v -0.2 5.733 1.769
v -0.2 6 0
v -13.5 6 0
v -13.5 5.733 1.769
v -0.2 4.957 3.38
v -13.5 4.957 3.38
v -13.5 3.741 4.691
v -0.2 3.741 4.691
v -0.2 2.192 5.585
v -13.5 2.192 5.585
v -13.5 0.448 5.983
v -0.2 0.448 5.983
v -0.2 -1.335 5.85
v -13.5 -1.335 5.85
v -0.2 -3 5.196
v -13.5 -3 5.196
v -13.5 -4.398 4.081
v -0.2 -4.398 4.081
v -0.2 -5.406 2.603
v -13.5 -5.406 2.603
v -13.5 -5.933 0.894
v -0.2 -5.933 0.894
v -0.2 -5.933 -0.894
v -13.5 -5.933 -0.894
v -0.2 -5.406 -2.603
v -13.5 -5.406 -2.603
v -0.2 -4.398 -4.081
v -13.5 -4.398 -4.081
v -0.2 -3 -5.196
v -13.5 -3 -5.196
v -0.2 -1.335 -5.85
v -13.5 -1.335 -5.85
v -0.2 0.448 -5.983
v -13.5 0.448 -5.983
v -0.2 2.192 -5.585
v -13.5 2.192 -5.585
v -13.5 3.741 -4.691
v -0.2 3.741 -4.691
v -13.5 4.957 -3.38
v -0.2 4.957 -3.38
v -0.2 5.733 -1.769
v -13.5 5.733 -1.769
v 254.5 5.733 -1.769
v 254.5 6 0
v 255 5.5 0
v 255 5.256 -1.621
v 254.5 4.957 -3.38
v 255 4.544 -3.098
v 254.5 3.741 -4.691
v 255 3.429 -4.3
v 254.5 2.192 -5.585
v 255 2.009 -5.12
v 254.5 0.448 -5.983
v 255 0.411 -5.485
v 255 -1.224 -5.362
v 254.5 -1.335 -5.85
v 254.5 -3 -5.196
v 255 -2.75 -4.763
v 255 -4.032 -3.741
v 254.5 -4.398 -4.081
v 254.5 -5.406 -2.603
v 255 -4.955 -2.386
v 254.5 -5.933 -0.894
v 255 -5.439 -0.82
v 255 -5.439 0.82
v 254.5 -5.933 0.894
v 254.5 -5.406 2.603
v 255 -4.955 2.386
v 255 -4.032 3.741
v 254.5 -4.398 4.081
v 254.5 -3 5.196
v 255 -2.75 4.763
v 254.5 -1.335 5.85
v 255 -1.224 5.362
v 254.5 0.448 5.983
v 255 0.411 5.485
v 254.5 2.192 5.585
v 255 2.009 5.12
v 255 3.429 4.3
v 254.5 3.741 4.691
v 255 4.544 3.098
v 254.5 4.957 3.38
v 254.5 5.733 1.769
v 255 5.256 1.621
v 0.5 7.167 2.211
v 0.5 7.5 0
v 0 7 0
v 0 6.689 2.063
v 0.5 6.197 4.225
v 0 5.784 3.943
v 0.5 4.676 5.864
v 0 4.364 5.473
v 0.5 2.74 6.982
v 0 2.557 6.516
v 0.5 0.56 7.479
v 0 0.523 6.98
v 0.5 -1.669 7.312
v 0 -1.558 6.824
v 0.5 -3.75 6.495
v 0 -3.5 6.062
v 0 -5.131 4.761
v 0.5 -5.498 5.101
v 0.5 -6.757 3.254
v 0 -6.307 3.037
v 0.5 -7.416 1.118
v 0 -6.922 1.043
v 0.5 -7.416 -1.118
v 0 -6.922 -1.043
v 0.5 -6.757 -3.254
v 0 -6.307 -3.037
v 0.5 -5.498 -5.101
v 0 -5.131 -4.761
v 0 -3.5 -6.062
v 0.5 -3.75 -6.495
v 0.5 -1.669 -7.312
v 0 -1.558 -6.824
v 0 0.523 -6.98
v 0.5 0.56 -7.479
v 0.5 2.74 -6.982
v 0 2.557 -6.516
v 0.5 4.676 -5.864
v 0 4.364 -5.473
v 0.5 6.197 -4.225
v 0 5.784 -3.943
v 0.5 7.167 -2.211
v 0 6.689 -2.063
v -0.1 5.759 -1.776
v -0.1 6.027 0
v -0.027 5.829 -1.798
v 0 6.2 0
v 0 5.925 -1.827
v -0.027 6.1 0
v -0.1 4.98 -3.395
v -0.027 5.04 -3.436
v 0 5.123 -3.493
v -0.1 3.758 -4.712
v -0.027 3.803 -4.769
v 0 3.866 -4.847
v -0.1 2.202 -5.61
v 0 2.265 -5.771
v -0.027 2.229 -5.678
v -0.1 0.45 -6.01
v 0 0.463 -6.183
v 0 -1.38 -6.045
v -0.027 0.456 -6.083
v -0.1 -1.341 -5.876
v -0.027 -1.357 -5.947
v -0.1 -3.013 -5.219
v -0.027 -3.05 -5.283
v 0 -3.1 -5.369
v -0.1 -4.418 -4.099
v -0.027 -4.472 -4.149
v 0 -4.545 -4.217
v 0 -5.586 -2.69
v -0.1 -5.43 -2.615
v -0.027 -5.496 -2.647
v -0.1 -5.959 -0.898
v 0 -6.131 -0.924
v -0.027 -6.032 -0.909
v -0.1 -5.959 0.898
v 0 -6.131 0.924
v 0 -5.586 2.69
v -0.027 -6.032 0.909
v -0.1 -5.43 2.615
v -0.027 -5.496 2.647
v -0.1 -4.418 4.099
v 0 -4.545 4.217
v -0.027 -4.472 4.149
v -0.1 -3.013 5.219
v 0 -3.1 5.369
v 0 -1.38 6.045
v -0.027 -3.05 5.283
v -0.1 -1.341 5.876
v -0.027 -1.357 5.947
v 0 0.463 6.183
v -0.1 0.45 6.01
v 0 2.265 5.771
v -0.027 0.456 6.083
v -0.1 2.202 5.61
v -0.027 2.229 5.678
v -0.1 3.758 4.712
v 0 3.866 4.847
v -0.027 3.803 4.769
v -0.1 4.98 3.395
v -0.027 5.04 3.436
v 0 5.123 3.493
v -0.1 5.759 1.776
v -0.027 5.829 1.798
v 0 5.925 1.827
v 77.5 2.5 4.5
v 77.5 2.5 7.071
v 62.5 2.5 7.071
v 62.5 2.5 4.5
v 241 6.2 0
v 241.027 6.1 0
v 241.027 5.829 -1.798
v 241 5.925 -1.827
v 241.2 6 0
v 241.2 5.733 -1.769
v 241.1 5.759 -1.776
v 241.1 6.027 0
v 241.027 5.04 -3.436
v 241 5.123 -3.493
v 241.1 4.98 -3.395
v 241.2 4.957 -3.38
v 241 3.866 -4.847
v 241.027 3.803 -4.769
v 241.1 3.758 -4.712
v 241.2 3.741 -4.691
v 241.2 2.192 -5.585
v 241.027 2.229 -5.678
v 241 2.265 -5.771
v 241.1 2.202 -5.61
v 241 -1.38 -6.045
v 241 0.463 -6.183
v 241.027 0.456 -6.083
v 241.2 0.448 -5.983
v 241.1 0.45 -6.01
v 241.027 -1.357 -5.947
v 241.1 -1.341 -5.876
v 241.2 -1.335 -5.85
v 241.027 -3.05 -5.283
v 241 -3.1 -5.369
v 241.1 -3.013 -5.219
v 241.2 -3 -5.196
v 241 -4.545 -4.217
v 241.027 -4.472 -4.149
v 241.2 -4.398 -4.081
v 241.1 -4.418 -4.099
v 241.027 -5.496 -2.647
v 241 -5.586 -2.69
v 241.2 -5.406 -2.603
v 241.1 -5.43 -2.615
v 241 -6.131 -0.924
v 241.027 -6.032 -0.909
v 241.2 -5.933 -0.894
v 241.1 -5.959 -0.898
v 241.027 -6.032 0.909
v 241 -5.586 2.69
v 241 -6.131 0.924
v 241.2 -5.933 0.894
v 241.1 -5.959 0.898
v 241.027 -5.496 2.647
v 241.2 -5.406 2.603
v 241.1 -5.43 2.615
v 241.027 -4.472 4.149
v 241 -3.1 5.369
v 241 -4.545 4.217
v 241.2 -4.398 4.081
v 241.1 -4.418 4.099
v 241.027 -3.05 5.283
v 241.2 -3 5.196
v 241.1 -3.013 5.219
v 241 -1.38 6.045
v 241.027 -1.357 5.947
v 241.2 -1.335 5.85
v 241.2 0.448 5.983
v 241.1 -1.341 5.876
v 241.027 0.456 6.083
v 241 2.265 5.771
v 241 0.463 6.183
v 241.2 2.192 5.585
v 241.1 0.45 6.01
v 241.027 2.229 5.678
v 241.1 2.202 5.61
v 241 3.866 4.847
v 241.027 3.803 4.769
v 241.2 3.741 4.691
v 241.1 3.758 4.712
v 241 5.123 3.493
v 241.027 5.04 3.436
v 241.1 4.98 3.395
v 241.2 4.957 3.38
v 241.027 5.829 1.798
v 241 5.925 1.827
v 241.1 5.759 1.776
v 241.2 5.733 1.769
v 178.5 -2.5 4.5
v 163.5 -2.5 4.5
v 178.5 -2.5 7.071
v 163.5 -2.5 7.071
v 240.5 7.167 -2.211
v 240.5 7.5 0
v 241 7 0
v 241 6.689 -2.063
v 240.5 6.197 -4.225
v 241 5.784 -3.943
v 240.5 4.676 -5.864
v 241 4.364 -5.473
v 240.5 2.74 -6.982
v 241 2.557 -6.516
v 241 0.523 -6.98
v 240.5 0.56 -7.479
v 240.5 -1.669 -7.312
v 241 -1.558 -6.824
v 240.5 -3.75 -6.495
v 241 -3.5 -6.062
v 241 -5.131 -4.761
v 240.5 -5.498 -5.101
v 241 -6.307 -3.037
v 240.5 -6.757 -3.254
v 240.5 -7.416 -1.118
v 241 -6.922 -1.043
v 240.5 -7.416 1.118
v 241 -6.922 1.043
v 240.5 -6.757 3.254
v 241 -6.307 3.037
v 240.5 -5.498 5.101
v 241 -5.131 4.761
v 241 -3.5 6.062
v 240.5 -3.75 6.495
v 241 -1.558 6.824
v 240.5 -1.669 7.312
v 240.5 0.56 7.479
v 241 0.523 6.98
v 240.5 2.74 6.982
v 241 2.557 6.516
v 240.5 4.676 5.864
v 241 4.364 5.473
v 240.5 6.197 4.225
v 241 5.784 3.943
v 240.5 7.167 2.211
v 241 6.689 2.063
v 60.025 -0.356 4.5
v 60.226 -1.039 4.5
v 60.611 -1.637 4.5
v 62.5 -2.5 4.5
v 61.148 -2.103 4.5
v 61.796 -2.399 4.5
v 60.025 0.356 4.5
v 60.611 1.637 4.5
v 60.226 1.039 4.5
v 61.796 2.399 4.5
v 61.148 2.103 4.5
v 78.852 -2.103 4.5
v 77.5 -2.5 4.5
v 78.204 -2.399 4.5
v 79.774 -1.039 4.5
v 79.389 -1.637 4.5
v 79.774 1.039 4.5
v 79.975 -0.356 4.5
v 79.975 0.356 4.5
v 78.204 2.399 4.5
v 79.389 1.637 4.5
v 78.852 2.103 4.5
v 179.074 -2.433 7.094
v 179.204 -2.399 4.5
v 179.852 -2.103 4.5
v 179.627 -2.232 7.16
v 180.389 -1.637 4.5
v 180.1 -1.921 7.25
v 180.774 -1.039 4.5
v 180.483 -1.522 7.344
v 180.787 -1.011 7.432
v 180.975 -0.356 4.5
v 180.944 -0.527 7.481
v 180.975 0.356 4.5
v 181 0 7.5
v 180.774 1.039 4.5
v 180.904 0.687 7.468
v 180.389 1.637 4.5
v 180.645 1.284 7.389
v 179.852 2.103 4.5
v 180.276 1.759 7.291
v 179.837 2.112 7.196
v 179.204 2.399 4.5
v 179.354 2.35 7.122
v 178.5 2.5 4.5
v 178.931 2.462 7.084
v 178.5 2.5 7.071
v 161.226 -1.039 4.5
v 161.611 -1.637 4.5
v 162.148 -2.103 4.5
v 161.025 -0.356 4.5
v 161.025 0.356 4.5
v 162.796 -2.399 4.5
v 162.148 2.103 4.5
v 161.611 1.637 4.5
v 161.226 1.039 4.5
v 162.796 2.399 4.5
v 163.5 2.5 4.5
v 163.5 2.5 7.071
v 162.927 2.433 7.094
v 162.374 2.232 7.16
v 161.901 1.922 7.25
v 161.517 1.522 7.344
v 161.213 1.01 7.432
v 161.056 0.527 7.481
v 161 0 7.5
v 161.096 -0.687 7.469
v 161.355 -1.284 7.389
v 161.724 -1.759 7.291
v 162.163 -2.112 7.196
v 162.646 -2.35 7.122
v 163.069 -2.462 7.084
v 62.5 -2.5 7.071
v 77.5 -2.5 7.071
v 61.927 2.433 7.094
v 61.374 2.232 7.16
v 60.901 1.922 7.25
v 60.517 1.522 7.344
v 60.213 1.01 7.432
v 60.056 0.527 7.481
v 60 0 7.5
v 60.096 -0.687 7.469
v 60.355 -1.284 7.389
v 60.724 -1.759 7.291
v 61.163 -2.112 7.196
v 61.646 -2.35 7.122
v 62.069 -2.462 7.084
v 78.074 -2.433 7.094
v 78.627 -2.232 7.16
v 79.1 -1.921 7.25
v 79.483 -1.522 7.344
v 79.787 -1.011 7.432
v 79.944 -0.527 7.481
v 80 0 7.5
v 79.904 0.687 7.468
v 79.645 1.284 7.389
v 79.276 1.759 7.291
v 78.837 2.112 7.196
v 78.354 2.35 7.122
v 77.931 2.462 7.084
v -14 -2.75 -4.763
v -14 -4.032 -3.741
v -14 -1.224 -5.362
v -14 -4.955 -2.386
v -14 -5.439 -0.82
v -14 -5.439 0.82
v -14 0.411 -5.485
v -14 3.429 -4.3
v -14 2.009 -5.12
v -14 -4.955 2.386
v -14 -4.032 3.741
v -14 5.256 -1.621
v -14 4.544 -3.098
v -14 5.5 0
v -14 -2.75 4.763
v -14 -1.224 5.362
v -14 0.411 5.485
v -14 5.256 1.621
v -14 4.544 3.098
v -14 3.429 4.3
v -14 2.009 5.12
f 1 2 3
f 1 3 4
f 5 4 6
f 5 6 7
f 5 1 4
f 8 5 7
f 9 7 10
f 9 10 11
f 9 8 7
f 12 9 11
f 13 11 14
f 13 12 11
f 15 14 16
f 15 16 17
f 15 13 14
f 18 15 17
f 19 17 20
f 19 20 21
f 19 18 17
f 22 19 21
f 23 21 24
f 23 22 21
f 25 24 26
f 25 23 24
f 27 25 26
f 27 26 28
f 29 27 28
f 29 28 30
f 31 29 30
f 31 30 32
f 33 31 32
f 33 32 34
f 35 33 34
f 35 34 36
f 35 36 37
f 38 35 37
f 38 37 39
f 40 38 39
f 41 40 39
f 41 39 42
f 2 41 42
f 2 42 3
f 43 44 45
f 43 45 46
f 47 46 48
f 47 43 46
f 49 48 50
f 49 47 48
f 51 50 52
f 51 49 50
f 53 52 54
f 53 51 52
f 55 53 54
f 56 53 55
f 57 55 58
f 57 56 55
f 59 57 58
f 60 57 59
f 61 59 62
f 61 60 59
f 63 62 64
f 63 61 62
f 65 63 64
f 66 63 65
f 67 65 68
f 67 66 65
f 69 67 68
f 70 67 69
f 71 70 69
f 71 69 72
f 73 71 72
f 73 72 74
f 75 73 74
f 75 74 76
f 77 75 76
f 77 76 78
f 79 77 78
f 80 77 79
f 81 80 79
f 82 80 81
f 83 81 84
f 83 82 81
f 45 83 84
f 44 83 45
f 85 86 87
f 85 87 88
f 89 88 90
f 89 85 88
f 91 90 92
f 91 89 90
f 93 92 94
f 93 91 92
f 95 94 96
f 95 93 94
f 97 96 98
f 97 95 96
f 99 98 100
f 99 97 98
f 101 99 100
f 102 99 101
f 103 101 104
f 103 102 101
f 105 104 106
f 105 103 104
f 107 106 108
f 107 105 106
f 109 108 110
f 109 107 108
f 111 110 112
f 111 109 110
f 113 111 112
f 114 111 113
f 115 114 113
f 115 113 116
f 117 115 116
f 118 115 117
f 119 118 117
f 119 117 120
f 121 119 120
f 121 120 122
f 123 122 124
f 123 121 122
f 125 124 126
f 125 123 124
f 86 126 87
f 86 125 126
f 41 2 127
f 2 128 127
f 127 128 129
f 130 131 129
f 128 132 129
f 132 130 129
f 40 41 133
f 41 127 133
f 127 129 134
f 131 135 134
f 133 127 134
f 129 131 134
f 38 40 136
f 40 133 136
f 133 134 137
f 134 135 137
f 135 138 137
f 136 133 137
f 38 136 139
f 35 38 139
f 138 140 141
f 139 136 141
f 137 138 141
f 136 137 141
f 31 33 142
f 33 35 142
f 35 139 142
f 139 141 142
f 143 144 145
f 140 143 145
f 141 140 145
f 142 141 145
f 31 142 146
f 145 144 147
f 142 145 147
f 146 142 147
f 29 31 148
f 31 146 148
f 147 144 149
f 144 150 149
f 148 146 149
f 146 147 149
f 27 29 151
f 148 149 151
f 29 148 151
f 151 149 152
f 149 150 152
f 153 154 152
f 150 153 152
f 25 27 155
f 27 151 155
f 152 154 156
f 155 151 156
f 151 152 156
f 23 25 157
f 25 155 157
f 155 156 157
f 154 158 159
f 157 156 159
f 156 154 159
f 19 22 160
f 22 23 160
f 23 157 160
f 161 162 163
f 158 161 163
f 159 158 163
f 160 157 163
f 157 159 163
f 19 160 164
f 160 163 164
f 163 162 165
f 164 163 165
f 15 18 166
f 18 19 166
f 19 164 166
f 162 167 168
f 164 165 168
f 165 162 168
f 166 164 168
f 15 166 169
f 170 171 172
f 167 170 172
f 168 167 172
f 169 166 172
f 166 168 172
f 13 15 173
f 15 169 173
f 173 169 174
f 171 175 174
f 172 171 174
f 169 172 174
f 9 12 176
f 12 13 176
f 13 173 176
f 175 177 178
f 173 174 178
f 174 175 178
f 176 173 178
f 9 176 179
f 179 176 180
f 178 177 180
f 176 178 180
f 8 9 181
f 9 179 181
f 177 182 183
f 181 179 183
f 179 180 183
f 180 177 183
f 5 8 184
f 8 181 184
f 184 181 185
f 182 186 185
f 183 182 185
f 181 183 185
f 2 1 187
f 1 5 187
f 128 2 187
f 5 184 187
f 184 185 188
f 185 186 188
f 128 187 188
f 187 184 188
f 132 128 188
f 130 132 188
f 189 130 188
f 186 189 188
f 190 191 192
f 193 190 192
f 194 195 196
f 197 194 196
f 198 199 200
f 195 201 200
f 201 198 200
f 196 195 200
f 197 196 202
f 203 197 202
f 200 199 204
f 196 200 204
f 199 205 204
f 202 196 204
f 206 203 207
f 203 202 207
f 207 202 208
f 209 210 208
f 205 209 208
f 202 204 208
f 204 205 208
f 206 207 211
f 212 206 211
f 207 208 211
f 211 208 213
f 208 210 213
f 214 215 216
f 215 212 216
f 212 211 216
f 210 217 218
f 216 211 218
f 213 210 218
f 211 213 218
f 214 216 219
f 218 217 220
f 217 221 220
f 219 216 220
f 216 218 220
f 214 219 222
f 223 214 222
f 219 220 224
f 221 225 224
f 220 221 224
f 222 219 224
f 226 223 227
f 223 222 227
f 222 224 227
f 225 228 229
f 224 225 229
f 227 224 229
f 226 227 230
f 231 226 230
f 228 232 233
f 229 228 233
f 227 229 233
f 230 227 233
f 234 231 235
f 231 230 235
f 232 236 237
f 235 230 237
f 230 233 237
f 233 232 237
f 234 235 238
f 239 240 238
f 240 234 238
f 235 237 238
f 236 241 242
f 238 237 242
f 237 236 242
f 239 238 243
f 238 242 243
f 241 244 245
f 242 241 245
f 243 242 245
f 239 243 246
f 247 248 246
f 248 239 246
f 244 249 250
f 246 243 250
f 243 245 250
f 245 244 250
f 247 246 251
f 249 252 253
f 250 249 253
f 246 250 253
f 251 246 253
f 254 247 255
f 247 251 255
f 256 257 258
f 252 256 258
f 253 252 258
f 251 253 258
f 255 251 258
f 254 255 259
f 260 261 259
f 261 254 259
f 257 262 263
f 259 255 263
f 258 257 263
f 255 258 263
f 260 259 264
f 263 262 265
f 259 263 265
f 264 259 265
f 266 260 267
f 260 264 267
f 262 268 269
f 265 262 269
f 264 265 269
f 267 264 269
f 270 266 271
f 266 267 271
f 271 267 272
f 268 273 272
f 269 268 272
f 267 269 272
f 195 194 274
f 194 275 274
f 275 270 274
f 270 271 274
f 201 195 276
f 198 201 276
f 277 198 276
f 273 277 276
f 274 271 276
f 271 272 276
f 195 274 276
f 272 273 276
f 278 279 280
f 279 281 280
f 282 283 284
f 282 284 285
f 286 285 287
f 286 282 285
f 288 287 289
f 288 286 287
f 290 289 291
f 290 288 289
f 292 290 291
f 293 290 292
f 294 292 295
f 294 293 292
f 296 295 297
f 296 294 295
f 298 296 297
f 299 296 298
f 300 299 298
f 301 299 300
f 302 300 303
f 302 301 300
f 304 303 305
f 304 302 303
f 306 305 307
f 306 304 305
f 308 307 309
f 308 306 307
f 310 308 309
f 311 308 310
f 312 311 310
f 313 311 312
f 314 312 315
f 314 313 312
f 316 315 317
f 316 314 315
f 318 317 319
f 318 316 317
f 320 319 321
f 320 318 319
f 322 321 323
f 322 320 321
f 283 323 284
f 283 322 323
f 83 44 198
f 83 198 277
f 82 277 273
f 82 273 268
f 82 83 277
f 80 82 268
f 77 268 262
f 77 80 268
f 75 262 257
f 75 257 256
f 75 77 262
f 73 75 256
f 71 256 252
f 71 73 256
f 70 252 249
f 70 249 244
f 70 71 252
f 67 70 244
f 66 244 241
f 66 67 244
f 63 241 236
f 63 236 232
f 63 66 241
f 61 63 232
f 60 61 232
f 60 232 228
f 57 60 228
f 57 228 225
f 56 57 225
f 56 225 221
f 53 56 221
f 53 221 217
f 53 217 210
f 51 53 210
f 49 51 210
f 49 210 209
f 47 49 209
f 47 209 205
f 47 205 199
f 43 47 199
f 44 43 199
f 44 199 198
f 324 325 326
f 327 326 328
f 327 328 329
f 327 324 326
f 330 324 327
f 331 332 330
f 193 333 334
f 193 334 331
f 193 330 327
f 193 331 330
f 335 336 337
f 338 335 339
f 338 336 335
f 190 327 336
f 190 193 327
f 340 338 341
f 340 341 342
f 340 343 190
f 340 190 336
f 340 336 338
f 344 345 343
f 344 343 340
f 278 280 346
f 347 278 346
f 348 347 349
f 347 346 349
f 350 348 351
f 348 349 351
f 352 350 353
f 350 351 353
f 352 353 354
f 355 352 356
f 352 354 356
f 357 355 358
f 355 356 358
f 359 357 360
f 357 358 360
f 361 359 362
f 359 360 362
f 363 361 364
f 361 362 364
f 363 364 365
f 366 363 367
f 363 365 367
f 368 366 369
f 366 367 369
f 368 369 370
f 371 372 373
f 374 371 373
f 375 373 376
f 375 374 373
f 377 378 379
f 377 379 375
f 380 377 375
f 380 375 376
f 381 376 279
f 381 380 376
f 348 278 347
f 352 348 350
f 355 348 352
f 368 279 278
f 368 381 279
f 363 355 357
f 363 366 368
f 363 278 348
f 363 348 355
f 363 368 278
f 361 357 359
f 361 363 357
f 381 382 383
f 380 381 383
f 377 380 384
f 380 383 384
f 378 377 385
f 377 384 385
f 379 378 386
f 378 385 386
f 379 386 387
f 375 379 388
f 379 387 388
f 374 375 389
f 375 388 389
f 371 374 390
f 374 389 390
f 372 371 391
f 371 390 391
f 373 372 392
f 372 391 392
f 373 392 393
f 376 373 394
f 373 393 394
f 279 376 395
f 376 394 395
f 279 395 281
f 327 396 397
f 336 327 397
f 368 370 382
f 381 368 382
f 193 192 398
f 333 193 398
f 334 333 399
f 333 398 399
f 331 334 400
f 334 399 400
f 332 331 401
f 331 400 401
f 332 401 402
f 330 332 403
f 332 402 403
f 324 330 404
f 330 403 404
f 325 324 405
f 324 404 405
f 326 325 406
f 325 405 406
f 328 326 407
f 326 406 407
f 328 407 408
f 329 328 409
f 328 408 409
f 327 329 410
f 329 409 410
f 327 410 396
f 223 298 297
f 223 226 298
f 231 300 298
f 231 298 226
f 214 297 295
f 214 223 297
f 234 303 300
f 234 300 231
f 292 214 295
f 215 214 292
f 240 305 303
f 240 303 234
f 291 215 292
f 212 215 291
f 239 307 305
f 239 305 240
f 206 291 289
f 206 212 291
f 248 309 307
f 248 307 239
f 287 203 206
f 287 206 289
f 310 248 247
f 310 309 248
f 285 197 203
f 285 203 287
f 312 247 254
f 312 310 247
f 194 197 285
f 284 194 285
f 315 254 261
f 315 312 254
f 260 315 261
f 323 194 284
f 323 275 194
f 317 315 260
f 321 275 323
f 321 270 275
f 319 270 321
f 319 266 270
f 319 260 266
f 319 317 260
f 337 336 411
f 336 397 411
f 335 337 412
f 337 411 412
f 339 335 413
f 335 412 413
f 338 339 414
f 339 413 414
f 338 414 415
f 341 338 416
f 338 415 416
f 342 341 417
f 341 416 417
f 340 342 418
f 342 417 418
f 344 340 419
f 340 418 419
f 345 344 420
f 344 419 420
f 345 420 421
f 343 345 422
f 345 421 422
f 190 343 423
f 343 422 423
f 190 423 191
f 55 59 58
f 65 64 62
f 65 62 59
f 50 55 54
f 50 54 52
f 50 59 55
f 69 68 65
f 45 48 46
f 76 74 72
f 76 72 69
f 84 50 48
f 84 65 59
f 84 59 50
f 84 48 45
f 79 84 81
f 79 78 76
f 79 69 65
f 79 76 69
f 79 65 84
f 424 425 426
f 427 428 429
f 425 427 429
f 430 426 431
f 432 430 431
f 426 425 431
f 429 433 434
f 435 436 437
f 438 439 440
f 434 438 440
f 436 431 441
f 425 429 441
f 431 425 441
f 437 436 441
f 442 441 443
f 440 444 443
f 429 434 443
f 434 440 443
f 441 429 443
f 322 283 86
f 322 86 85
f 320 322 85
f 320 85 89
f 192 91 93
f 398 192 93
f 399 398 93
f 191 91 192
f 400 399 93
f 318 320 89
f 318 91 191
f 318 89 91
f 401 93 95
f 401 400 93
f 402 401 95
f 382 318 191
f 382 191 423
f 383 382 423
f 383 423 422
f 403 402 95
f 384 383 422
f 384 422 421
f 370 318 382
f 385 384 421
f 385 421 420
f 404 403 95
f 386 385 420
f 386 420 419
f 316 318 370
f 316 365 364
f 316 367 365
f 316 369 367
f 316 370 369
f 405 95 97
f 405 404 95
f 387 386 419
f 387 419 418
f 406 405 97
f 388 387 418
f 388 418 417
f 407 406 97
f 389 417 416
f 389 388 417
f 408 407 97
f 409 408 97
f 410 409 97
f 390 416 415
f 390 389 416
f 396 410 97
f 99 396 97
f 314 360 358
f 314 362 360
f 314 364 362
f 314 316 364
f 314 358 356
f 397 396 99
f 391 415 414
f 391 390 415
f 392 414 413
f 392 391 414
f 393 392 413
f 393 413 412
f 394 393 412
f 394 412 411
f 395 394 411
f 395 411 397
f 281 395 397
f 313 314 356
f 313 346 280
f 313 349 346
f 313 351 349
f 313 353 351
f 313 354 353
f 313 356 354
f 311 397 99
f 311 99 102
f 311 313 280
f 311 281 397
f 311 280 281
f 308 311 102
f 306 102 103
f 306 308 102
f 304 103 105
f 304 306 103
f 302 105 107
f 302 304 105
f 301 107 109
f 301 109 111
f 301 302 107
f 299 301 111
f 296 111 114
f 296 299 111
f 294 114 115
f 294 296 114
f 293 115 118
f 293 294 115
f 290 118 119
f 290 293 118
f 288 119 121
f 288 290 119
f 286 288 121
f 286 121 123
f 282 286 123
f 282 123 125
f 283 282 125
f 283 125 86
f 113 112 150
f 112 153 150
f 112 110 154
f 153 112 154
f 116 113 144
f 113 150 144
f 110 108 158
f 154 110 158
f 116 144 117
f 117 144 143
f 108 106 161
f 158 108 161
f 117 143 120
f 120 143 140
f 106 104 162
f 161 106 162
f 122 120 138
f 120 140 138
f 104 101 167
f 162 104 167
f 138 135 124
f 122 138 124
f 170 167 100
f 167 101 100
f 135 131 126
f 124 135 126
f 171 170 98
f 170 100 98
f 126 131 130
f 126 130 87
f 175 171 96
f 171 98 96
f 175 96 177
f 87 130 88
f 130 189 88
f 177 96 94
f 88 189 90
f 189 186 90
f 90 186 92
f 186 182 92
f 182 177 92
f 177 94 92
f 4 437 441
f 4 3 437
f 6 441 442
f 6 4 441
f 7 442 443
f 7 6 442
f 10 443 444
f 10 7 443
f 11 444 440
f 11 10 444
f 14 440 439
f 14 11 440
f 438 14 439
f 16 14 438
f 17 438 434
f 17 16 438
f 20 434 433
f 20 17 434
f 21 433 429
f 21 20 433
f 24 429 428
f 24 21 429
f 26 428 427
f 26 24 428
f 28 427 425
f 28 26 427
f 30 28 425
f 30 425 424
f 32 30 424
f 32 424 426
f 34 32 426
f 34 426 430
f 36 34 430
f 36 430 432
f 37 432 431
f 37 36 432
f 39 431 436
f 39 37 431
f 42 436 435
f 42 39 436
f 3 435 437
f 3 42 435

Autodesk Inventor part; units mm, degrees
ref_plane "YZ Plane" through (0, 0, 0) normal (1, 0, 0) x (0, 1, 0)
ref_plane "XZ Plane" through (0, 0, 0) normal (0, 1, 0) x (-1, 0, 0)
ref_plane "XY Plane" through (0, 0, 0) normal (0, 0, 1) x (1, 0, 0)
sketch "Sketch_1" plane through (0, 0, 0) normal (0, 0, 1) x (1, 0, 0)
  line L0 (255, 0) -> (-14, 0)
  line L1 (-14, 0) -> (-14, 5.5)
  line L2 (-14, 5.5) -> (-13.5, 6)
  line L3 (-13.5, 6) -> (-0.2, 6)
  arc A0 (-0.2, 6) -> (0, 6.2) centre (-0.2, 6.2) ccw
  line L4 (0, 6.2) -> (0, 7)
  line L5 (0, 7) -> (0.5, 7.5)
  line L6 (0.5, 7.5) -> (240.5, 7.5)
  line L7 (240.5, 7.5) -> (241, 7)
  line L8 (241, 7) -> (241, 6.2)
  arc A1 (241, 6.2) -> (241.2, 6) centre (241.2, 6.2) ccw
  line L9 (241.2, 6) -> (254.5, 6)
  line L10 (254.5, 6) -> (255, 5.5)
  line L11 (255, 5.5) -> (255, 0)
  line L12 (255, 0) -> (-14, 0)
revolve "Revolution1" add sketch "Sketch_1" angle 360 about axis through (255, 0, 0) along (1, 0, 0)
sketch "_____2" plane through (0, 0, 7.5) normal (0, 0, 1) x (1, 0, 0)
  arc A0 (62.5, 2.5) -> (62.5, -2.5) centre (62.5, 0) ccw
  line L0 (62.5, -2.5) -> (77.5, -2.5)
  arc A1 (77.5, -2.5) -> (77.5, 2.5) centre (77.5, 0) ccw
  line L1 (77.5, 2.5) -> (62.5, 2.5)
extrude "Extrusion1" cut sketch "_____2" against normal blind 3
sketch "_____6" plane through (0, 0, 7.5) normal (0, 0, 1) x (1, 0, 0)
  arc A0 (163.5, 2.5) -> (163.5, -2.5) centre (163.5, 0) ccw
  line L0 (163.5, -2.5) -> (178.5, -2.5)
  arc A1 (178.5, -2.5) -> (178.5, 2.5) centre (178.5, 0) ccw
  line L1 (178.5, 2.5) -> (163.5, 2.5)
extrude "Extrusion2" cut sketch "_____6" against normal blind 3
properties part number "NSFRQ15-241-F14-P12-T14-Q12-WKC60-C20-K60-E20_s"
